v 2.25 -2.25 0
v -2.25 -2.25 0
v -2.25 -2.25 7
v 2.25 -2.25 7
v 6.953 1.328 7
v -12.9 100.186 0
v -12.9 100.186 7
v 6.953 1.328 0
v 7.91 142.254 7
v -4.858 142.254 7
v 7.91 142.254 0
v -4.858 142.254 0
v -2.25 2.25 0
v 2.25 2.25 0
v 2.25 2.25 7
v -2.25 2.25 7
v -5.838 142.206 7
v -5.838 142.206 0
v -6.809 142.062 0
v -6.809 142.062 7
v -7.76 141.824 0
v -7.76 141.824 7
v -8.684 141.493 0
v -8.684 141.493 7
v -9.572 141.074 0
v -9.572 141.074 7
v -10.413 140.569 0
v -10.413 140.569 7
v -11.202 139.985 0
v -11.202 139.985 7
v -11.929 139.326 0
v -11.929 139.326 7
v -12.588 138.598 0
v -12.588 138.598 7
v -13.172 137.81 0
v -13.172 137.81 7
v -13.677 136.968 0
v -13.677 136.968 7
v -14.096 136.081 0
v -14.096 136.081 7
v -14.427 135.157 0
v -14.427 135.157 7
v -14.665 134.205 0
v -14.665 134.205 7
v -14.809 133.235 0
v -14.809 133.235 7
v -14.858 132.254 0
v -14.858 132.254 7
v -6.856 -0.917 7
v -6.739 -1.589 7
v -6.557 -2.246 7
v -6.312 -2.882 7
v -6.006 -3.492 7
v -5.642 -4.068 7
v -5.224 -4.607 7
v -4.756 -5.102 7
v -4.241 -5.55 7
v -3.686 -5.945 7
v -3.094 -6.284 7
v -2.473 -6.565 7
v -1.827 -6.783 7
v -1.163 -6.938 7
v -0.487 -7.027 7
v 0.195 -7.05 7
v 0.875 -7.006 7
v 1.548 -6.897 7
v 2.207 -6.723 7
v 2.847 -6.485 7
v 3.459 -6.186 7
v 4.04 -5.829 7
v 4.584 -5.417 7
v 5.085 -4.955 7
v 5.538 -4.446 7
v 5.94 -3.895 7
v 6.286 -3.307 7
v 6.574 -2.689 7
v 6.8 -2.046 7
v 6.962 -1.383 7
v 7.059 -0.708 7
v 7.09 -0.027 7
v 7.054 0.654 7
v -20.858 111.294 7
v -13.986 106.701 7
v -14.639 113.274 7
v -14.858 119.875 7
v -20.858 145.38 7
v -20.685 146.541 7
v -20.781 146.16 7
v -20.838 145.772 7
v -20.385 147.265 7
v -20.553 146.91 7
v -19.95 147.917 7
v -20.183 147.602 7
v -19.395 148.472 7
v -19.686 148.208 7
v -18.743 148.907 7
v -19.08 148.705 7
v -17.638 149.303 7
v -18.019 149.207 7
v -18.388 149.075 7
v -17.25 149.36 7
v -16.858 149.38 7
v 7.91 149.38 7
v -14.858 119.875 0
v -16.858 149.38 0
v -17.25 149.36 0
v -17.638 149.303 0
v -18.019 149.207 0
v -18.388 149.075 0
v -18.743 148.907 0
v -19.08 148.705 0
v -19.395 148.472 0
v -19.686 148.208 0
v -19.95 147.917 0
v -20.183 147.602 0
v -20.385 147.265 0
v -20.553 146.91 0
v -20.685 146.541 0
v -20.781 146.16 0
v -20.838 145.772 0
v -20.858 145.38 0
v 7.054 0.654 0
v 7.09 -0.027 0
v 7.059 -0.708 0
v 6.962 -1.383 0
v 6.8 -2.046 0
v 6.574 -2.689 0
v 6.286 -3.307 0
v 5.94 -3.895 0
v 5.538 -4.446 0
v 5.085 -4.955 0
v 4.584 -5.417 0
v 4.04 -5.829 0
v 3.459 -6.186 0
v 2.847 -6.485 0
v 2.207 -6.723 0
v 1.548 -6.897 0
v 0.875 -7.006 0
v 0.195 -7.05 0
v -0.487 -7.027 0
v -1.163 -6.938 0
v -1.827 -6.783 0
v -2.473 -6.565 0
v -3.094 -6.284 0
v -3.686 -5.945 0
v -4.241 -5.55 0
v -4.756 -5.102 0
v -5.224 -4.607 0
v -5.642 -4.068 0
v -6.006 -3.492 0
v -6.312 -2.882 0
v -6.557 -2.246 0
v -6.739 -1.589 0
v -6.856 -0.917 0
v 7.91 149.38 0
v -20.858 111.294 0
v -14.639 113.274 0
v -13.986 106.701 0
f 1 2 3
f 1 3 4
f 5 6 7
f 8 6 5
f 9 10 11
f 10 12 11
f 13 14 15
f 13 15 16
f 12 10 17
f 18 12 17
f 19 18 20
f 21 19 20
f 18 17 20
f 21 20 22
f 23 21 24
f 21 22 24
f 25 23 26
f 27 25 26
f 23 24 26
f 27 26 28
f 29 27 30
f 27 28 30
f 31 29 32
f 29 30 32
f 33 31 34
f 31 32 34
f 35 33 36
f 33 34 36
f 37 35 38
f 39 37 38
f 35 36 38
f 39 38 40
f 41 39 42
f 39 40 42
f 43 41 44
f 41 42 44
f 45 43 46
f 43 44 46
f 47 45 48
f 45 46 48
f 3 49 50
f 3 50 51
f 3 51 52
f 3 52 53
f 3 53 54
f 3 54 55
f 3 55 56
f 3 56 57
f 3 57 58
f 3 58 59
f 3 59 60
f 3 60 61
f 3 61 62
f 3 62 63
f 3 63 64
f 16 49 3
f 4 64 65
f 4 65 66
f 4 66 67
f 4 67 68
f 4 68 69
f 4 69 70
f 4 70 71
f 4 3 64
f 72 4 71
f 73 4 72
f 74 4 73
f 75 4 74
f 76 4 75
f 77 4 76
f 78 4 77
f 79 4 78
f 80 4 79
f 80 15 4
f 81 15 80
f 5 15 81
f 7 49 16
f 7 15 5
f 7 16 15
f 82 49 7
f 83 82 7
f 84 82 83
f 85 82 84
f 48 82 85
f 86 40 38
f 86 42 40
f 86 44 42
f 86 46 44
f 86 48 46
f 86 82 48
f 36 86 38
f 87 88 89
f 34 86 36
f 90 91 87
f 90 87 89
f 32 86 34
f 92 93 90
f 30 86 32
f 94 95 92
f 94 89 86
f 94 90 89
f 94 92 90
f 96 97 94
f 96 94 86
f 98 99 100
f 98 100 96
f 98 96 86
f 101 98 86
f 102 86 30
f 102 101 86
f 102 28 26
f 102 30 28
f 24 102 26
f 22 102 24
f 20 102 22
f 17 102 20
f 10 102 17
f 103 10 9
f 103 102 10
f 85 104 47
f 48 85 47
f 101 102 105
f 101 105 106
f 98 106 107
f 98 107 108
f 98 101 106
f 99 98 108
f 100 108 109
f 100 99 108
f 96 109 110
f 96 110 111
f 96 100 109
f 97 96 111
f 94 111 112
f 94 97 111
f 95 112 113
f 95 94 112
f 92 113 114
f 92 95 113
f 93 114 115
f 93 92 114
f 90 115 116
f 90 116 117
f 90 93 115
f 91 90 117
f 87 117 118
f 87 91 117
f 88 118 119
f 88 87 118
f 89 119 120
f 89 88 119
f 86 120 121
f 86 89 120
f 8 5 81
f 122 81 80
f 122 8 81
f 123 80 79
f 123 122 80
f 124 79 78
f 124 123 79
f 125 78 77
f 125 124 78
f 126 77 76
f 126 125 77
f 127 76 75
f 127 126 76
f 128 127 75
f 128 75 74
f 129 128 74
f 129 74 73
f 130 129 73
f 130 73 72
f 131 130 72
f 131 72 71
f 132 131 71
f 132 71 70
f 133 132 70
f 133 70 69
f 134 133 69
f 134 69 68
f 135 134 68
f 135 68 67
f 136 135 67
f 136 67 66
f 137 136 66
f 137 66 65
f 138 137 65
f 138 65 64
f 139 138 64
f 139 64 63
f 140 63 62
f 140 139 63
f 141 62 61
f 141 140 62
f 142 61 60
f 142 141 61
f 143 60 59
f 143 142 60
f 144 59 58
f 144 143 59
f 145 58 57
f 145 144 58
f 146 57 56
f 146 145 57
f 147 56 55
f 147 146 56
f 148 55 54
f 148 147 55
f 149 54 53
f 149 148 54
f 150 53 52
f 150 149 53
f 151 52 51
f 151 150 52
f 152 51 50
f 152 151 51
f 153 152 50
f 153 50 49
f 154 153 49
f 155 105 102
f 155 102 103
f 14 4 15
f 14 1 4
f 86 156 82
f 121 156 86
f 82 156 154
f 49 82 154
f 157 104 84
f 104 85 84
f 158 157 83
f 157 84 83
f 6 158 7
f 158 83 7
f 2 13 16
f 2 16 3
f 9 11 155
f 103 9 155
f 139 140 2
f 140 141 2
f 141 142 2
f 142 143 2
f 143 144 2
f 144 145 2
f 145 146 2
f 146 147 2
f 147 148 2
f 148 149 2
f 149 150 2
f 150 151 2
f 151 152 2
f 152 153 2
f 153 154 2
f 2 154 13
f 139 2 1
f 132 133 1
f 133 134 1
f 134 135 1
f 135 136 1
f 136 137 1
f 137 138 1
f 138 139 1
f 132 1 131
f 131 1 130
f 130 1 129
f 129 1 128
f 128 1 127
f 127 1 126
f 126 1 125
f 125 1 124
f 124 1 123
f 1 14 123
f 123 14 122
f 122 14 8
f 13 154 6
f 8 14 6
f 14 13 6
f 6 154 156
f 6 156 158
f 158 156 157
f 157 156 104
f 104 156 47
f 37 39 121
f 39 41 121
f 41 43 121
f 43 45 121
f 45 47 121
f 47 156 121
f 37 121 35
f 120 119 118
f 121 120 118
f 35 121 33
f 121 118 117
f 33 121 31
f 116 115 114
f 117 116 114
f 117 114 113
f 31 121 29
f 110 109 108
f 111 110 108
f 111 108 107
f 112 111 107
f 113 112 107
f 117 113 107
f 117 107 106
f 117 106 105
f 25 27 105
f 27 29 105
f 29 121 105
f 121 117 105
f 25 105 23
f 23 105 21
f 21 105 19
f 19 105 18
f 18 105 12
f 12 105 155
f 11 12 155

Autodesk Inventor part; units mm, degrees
ref_plane "YZ Plane" through (0, 0, 0) normal (1, 0, 0) x (0, 1, 0)
ref_plane "XZ Plane" through (0, 0, 0) normal (0, 1, 0) x (-1, 0, 0)
ref_plane "XY Plane" through (0, 0, 0) normal (0, 0, 1) x (1, 0, 0)
sketch "Эскиз1" plane through (0, 0, 0) normal (0, 0, 1) x (1, 0, 0)
  circle A0 centre (0.0899, -0.0505) radius 4 projected
  line L0 (-20.8576, 111.2941) -> (-20.8576, 149.3795)
  line L1 (-20.8576, 149.3795) -> (-6.2988, 149.3795)
  line L2 (7.9099, 149.3795) -> (-6.2988, 149.3795)
  line L3 (-14.8576, 142.2545) -> (7.9099, 142.2545)
  line L4 (-14.8576, 142.2545) -> (7.9099, 142.2545)
  line L5 (-14.8576, 109.9334) -> (-14.8576, 142.2545)
  circle A1 centre (0.0899, -0.0505) radius 7
  line L6 (-2.25, -2.25) -> (2.25, -2.25)
  line L7 (2.25, -2.25) -> (2.25, 2.25)
  line L8 (2.25, 2.25) -> (-2.25, 2.25)
  line L9 (-2.25, 2.25) -> (-2.25, -2.25)
  line L10 (-2.25, -2.25) -> (2.25, 2.25) construction
  line L11 (2.25, -2.25) -> (-2.25, 2.25) construction
  line L12 (7.9099, 142.2545) -> (7.9099, 149.3795)
  line L13 (-20.8576, 111.2941) -> (-6.8563, -0.9172)
  line L14 (-14.8576, 109.9334) -> (6.9529, 1.3278)
  point P0 (0, 0)
  dimension "d0" = 14
  dimension "d1" = 4.5
  dimension "d2" = 4.5
extrude "Выдавливание1" add sketch "Эскиз1" along normal blind 7 contours A0 | L0 L1 L2 L12 L3 L5 L14 A1 L13 | A1
fillet "Сопряжение1" radius 10 1 edges at (-14.8576, 142.2545, 3.5)
fillet "Сопряжение2" radius 4 1 edges at (-20.8576, 149.3795, 3.5)
fillet "Сопряжение3" radius 100 1 edges at (-14.8576, 109.9334, 3.5)
properties part number "Arm"
